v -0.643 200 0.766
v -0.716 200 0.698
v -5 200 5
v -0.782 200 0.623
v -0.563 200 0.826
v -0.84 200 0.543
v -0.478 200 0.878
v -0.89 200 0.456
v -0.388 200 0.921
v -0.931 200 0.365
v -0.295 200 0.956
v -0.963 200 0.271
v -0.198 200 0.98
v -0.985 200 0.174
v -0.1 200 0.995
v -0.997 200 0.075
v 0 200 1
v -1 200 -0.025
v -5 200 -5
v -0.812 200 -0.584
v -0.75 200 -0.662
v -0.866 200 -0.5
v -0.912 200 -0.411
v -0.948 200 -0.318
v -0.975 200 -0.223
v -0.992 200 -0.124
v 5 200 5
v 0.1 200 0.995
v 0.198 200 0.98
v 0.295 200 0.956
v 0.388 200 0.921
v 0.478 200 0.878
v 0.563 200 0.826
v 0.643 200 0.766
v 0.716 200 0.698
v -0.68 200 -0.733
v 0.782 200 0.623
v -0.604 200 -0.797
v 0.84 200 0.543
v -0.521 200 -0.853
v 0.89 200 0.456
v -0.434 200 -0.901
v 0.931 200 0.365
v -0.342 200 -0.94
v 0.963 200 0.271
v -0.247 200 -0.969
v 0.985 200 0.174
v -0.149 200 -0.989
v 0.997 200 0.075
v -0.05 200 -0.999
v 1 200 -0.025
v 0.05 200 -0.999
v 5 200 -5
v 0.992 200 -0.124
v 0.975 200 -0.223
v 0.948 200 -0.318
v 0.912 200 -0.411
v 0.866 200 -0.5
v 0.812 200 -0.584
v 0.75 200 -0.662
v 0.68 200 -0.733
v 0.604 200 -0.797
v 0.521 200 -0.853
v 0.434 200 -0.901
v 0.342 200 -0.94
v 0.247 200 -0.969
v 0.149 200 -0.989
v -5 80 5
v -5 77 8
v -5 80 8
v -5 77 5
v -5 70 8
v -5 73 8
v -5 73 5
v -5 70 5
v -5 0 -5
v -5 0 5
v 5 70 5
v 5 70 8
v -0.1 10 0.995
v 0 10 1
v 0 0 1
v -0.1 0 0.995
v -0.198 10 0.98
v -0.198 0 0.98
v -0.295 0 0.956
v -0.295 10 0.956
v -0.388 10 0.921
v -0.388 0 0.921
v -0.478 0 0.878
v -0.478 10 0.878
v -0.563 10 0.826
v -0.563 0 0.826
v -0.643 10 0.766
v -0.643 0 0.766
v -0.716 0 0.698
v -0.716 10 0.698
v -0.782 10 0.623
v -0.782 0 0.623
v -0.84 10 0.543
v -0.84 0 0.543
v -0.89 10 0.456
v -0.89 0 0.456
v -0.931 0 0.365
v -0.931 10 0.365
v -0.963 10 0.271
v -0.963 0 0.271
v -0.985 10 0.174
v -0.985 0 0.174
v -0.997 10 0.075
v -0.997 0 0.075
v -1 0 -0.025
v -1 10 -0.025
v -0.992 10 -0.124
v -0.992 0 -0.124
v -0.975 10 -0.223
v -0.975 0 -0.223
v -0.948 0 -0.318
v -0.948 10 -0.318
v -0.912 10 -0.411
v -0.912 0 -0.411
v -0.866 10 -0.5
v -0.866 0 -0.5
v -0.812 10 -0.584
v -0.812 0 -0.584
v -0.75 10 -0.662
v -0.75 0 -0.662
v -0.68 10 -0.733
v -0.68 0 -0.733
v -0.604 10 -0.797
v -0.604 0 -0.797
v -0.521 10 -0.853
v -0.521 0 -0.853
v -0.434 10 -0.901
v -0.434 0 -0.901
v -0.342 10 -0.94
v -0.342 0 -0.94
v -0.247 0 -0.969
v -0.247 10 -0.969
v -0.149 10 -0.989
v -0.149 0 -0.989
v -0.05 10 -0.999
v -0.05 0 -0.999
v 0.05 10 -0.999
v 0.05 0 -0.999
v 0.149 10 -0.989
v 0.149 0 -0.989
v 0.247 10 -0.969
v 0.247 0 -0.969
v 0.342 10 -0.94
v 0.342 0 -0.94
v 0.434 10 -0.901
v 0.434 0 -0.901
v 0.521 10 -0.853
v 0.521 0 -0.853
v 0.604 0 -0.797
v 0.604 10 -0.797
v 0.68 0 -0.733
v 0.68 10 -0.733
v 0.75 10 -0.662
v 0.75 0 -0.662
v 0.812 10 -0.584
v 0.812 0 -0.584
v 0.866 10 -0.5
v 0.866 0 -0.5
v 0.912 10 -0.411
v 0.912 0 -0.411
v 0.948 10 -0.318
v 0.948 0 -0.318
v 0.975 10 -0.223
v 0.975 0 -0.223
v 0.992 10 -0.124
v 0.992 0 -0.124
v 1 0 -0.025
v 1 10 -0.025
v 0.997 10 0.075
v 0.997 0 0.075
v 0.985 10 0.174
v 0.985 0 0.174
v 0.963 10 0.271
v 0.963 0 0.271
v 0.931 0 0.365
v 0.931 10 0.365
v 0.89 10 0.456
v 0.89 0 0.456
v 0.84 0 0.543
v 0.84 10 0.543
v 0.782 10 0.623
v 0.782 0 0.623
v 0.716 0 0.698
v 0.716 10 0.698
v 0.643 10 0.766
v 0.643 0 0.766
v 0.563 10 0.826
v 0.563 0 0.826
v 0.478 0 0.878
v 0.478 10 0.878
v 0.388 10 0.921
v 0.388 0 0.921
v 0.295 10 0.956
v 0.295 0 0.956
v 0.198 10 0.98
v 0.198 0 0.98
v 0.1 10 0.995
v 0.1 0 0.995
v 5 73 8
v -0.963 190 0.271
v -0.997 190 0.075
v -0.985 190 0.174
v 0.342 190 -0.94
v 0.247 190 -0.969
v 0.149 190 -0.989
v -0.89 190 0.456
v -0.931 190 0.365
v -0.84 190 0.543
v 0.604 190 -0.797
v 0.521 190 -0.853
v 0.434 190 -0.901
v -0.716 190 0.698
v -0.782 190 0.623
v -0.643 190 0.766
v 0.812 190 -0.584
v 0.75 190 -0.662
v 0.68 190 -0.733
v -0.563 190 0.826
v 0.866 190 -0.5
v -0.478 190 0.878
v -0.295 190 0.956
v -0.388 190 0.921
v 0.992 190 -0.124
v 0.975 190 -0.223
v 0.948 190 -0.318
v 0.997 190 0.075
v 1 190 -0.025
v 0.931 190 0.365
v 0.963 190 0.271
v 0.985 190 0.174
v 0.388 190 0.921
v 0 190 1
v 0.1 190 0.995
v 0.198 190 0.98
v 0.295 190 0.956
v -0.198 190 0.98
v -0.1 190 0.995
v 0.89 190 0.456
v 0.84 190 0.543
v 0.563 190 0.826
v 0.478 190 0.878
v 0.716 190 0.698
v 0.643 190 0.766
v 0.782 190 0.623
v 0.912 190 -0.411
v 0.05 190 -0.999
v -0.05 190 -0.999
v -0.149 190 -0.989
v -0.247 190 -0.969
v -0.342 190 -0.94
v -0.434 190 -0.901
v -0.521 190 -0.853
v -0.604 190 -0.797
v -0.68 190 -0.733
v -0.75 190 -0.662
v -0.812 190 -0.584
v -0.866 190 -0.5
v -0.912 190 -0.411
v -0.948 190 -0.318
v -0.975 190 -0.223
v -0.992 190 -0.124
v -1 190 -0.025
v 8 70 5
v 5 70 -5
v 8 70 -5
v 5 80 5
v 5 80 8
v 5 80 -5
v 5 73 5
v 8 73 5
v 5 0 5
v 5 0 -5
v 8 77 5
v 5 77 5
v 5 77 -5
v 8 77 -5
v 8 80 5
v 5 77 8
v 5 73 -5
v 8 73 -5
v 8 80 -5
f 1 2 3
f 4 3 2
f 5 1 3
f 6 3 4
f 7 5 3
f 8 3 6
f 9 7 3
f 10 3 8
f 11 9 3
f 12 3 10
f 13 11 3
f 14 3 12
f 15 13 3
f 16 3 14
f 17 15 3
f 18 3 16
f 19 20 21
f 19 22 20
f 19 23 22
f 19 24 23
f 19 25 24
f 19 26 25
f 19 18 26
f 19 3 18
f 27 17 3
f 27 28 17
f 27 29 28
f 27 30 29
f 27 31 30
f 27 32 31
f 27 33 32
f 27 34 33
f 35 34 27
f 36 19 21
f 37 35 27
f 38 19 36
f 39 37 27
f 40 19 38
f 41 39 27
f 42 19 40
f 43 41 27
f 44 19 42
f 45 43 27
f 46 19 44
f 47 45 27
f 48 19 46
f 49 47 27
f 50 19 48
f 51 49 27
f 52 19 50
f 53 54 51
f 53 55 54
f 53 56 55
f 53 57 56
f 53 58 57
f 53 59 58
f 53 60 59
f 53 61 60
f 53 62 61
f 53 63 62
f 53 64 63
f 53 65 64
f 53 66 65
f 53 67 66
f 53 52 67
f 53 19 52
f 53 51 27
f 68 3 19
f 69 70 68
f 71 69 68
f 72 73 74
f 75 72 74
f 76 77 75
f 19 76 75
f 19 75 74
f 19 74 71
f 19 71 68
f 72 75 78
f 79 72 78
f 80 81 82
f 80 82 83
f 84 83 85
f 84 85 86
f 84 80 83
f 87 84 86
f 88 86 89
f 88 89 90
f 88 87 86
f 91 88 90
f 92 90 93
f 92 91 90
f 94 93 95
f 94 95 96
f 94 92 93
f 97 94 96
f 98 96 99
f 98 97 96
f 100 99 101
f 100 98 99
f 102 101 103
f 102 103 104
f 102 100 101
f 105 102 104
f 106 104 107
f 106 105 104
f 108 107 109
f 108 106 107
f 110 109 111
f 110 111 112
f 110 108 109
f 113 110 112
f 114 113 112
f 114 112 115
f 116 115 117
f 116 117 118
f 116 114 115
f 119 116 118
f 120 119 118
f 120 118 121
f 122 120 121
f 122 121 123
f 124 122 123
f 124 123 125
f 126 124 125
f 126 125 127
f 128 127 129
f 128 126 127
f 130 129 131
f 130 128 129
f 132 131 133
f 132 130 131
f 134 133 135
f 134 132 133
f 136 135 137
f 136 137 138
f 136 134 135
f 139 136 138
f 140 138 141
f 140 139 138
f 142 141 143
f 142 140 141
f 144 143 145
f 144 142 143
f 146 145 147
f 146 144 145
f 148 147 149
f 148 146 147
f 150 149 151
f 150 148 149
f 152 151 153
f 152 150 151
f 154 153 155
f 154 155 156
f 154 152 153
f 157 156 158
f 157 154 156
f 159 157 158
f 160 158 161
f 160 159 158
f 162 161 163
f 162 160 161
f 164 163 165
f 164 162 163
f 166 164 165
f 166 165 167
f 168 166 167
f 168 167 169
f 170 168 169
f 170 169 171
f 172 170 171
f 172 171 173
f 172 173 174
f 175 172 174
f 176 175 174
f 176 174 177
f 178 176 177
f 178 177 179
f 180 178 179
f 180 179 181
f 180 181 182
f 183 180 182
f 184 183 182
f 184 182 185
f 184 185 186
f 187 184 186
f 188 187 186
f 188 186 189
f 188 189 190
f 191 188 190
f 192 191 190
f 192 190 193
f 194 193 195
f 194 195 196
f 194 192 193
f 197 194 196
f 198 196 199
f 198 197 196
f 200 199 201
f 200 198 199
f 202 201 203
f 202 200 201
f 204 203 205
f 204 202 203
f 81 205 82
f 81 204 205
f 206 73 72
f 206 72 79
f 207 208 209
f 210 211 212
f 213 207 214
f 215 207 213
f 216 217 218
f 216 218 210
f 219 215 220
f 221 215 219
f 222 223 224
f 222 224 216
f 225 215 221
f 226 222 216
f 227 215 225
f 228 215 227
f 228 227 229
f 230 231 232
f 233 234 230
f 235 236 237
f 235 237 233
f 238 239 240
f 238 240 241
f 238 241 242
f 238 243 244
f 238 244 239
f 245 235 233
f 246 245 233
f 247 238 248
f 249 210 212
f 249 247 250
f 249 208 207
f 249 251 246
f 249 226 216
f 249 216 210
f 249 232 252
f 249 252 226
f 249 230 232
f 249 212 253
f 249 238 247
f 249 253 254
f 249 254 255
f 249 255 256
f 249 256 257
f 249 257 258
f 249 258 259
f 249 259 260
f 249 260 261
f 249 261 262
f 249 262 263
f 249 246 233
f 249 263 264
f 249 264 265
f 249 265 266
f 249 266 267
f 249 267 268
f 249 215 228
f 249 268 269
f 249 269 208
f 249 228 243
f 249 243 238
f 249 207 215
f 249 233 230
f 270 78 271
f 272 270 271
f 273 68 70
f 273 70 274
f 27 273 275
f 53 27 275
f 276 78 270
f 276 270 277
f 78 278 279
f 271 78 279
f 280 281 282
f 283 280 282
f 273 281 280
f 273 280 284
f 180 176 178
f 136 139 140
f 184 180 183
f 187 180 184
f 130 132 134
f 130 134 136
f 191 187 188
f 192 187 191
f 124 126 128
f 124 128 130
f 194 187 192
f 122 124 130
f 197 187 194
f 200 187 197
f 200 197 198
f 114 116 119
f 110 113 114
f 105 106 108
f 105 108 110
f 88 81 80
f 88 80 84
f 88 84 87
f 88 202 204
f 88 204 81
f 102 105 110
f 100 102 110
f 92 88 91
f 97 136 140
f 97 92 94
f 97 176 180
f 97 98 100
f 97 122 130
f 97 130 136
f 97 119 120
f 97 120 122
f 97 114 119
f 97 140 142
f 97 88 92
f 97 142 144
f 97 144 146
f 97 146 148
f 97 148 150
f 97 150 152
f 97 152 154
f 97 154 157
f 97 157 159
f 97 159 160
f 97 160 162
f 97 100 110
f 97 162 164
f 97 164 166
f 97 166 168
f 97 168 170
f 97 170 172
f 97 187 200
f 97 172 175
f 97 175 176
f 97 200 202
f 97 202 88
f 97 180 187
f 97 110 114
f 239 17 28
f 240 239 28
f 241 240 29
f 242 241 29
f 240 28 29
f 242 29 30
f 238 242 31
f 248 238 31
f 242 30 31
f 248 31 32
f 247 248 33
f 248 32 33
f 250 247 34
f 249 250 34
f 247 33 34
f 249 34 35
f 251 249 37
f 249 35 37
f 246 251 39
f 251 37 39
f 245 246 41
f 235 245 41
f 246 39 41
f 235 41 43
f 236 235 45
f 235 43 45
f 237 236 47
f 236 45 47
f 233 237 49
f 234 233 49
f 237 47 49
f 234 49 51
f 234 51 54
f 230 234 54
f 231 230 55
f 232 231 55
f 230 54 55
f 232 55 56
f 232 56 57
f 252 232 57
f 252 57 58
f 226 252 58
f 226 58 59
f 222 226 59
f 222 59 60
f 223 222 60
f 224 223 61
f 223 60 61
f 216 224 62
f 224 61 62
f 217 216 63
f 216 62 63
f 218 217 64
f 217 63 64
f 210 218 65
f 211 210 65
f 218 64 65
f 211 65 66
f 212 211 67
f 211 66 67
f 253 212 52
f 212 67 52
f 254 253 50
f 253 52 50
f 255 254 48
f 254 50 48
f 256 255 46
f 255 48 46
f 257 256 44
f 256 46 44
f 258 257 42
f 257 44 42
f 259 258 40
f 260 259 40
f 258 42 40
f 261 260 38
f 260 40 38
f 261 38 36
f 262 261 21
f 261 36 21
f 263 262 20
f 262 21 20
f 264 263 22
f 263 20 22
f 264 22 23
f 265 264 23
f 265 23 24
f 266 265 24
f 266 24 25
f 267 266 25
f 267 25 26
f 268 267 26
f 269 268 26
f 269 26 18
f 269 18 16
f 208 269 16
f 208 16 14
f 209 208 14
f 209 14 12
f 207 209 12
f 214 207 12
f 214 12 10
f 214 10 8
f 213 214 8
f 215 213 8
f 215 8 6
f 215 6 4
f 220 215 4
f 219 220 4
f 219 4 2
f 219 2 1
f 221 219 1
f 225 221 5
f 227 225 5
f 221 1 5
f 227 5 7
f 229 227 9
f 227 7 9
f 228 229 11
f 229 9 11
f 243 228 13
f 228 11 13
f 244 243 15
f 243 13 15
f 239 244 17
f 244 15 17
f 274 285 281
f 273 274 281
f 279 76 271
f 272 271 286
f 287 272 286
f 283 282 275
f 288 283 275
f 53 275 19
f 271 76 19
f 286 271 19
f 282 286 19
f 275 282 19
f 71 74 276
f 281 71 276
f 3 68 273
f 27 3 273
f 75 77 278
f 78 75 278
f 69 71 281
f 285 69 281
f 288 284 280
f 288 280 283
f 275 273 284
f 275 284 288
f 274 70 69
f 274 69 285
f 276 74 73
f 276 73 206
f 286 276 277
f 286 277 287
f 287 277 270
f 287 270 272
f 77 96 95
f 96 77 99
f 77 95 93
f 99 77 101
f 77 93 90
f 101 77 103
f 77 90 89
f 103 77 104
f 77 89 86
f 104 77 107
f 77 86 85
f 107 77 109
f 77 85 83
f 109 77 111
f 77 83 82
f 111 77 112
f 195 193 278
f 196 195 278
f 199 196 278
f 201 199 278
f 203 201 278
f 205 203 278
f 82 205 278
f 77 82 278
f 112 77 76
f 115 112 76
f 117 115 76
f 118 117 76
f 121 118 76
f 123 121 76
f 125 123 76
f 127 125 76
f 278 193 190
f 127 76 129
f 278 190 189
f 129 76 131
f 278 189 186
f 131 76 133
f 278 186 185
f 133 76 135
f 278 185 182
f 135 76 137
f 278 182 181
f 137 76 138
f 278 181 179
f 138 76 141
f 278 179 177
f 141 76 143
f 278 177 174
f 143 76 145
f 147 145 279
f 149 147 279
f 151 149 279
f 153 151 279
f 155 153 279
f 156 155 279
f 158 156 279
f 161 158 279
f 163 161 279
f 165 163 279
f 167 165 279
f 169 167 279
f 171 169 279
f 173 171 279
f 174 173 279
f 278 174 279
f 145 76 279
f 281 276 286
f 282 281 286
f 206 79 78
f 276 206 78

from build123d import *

# Parameters (mm, degrees)
SZKIC1_W                    = 10
SZKIC1_H                    = 10
DODANIE_WYCI_GNI_CIE1_DEPTH = 200
SZKIC2_R                    = 1
WYTNIJ_WYCI_GNI_CIE1_DEPTH  = 10
WYTNIJ_WYCI_GNI_CIE2_START  = -10
SZKIC3_R                    = 1
WYTNIJ_WYCI_GNI_CIE2_DEPTH  = 10
SZKIC4_W                    = 10
SZKIC4_H                    = 3
DODANIE_WYCI_GNI_CIE2_DEPTH = 3
SZKIC6_W                    = 10
SZKIC6_H                    = 3
DODANIE_WYCI_GNI_CIE3_DEPTH = 3


with BuildPart() as part:
    # Szkic1 → Dodanie-wyciągnięcie1 (new body)
    with BuildSketch(Plane(origin=(0, 0, 0), x_dir=(1, 0, 0), z_dir=(0, 1, 0))):
        Rectangle(SZKIC1_W, SZKIC1_H)
    extrude(amount=DODANIE_WYCI_GNI_CIE1_DEPTH)

    # Szkic2 → Wytnij-wyciągnięcie1 (cut)
    with BuildSketch(Plane(origin=(0, 200, 0), x_dir=(1, 0, 0), z_dir=(0, 1, 0))):
        with Locations(Location((0, 0, 0), (0, 0, 270))):
            Circle(SZKIC2_R)
    extrude(amount=-WYTNIJ_WYCI_GNI_CIE1_DEPTH, mode=Mode.SUBTRACT)

    # Szkic3 → Wytnij-wyciągnięcie2 (cut)
    with BuildSketch(Plane.XZ.offset(WYTNIJ_WYCI_GNI_CIE2_START)):
        with Locations(Location((0, 0, 0), (0, 0, 90))):
            Circle(SZKIC3_R)
    extrude(amount=WYTNIJ_WYCI_GNI_CIE2_DEPTH, mode=Mode.SUBTRACT)

    # Szkic4 → Dodanie-wyciągnięcie2 (add)
    with BuildSketch(Plane.XY.offset(5)):
        with Locations((0, 71.5)):
            Rectangle(SZKIC4_W, SZKIC4_H)
        with Locations((0, 78.5)):
            Rectangle(SZKIC4_W, SZKIC4_H)
    extrude(amount=DODANIE_WYCI_GNI_CIE2_DEPTH)

    # Szkic6 → Dodanie-wyciągnięcie3 (add)
    with BuildSketch(Plane(origin=(5, 0, 0), x_dir=(0, 0, -1), z_dir=(1, 0, 0))):
        with Locations((0, 71.5)):
            Rectangle(SZKIC6_W, SZKIC6_H)
        with Locations((0, 78.5)):
            Rectangle(SZKIC6_W, SZKIC6_H)
    extrude(amount=DODANIE_WYCI_GNI_CIE3_DEPTH)


solid = part.part
